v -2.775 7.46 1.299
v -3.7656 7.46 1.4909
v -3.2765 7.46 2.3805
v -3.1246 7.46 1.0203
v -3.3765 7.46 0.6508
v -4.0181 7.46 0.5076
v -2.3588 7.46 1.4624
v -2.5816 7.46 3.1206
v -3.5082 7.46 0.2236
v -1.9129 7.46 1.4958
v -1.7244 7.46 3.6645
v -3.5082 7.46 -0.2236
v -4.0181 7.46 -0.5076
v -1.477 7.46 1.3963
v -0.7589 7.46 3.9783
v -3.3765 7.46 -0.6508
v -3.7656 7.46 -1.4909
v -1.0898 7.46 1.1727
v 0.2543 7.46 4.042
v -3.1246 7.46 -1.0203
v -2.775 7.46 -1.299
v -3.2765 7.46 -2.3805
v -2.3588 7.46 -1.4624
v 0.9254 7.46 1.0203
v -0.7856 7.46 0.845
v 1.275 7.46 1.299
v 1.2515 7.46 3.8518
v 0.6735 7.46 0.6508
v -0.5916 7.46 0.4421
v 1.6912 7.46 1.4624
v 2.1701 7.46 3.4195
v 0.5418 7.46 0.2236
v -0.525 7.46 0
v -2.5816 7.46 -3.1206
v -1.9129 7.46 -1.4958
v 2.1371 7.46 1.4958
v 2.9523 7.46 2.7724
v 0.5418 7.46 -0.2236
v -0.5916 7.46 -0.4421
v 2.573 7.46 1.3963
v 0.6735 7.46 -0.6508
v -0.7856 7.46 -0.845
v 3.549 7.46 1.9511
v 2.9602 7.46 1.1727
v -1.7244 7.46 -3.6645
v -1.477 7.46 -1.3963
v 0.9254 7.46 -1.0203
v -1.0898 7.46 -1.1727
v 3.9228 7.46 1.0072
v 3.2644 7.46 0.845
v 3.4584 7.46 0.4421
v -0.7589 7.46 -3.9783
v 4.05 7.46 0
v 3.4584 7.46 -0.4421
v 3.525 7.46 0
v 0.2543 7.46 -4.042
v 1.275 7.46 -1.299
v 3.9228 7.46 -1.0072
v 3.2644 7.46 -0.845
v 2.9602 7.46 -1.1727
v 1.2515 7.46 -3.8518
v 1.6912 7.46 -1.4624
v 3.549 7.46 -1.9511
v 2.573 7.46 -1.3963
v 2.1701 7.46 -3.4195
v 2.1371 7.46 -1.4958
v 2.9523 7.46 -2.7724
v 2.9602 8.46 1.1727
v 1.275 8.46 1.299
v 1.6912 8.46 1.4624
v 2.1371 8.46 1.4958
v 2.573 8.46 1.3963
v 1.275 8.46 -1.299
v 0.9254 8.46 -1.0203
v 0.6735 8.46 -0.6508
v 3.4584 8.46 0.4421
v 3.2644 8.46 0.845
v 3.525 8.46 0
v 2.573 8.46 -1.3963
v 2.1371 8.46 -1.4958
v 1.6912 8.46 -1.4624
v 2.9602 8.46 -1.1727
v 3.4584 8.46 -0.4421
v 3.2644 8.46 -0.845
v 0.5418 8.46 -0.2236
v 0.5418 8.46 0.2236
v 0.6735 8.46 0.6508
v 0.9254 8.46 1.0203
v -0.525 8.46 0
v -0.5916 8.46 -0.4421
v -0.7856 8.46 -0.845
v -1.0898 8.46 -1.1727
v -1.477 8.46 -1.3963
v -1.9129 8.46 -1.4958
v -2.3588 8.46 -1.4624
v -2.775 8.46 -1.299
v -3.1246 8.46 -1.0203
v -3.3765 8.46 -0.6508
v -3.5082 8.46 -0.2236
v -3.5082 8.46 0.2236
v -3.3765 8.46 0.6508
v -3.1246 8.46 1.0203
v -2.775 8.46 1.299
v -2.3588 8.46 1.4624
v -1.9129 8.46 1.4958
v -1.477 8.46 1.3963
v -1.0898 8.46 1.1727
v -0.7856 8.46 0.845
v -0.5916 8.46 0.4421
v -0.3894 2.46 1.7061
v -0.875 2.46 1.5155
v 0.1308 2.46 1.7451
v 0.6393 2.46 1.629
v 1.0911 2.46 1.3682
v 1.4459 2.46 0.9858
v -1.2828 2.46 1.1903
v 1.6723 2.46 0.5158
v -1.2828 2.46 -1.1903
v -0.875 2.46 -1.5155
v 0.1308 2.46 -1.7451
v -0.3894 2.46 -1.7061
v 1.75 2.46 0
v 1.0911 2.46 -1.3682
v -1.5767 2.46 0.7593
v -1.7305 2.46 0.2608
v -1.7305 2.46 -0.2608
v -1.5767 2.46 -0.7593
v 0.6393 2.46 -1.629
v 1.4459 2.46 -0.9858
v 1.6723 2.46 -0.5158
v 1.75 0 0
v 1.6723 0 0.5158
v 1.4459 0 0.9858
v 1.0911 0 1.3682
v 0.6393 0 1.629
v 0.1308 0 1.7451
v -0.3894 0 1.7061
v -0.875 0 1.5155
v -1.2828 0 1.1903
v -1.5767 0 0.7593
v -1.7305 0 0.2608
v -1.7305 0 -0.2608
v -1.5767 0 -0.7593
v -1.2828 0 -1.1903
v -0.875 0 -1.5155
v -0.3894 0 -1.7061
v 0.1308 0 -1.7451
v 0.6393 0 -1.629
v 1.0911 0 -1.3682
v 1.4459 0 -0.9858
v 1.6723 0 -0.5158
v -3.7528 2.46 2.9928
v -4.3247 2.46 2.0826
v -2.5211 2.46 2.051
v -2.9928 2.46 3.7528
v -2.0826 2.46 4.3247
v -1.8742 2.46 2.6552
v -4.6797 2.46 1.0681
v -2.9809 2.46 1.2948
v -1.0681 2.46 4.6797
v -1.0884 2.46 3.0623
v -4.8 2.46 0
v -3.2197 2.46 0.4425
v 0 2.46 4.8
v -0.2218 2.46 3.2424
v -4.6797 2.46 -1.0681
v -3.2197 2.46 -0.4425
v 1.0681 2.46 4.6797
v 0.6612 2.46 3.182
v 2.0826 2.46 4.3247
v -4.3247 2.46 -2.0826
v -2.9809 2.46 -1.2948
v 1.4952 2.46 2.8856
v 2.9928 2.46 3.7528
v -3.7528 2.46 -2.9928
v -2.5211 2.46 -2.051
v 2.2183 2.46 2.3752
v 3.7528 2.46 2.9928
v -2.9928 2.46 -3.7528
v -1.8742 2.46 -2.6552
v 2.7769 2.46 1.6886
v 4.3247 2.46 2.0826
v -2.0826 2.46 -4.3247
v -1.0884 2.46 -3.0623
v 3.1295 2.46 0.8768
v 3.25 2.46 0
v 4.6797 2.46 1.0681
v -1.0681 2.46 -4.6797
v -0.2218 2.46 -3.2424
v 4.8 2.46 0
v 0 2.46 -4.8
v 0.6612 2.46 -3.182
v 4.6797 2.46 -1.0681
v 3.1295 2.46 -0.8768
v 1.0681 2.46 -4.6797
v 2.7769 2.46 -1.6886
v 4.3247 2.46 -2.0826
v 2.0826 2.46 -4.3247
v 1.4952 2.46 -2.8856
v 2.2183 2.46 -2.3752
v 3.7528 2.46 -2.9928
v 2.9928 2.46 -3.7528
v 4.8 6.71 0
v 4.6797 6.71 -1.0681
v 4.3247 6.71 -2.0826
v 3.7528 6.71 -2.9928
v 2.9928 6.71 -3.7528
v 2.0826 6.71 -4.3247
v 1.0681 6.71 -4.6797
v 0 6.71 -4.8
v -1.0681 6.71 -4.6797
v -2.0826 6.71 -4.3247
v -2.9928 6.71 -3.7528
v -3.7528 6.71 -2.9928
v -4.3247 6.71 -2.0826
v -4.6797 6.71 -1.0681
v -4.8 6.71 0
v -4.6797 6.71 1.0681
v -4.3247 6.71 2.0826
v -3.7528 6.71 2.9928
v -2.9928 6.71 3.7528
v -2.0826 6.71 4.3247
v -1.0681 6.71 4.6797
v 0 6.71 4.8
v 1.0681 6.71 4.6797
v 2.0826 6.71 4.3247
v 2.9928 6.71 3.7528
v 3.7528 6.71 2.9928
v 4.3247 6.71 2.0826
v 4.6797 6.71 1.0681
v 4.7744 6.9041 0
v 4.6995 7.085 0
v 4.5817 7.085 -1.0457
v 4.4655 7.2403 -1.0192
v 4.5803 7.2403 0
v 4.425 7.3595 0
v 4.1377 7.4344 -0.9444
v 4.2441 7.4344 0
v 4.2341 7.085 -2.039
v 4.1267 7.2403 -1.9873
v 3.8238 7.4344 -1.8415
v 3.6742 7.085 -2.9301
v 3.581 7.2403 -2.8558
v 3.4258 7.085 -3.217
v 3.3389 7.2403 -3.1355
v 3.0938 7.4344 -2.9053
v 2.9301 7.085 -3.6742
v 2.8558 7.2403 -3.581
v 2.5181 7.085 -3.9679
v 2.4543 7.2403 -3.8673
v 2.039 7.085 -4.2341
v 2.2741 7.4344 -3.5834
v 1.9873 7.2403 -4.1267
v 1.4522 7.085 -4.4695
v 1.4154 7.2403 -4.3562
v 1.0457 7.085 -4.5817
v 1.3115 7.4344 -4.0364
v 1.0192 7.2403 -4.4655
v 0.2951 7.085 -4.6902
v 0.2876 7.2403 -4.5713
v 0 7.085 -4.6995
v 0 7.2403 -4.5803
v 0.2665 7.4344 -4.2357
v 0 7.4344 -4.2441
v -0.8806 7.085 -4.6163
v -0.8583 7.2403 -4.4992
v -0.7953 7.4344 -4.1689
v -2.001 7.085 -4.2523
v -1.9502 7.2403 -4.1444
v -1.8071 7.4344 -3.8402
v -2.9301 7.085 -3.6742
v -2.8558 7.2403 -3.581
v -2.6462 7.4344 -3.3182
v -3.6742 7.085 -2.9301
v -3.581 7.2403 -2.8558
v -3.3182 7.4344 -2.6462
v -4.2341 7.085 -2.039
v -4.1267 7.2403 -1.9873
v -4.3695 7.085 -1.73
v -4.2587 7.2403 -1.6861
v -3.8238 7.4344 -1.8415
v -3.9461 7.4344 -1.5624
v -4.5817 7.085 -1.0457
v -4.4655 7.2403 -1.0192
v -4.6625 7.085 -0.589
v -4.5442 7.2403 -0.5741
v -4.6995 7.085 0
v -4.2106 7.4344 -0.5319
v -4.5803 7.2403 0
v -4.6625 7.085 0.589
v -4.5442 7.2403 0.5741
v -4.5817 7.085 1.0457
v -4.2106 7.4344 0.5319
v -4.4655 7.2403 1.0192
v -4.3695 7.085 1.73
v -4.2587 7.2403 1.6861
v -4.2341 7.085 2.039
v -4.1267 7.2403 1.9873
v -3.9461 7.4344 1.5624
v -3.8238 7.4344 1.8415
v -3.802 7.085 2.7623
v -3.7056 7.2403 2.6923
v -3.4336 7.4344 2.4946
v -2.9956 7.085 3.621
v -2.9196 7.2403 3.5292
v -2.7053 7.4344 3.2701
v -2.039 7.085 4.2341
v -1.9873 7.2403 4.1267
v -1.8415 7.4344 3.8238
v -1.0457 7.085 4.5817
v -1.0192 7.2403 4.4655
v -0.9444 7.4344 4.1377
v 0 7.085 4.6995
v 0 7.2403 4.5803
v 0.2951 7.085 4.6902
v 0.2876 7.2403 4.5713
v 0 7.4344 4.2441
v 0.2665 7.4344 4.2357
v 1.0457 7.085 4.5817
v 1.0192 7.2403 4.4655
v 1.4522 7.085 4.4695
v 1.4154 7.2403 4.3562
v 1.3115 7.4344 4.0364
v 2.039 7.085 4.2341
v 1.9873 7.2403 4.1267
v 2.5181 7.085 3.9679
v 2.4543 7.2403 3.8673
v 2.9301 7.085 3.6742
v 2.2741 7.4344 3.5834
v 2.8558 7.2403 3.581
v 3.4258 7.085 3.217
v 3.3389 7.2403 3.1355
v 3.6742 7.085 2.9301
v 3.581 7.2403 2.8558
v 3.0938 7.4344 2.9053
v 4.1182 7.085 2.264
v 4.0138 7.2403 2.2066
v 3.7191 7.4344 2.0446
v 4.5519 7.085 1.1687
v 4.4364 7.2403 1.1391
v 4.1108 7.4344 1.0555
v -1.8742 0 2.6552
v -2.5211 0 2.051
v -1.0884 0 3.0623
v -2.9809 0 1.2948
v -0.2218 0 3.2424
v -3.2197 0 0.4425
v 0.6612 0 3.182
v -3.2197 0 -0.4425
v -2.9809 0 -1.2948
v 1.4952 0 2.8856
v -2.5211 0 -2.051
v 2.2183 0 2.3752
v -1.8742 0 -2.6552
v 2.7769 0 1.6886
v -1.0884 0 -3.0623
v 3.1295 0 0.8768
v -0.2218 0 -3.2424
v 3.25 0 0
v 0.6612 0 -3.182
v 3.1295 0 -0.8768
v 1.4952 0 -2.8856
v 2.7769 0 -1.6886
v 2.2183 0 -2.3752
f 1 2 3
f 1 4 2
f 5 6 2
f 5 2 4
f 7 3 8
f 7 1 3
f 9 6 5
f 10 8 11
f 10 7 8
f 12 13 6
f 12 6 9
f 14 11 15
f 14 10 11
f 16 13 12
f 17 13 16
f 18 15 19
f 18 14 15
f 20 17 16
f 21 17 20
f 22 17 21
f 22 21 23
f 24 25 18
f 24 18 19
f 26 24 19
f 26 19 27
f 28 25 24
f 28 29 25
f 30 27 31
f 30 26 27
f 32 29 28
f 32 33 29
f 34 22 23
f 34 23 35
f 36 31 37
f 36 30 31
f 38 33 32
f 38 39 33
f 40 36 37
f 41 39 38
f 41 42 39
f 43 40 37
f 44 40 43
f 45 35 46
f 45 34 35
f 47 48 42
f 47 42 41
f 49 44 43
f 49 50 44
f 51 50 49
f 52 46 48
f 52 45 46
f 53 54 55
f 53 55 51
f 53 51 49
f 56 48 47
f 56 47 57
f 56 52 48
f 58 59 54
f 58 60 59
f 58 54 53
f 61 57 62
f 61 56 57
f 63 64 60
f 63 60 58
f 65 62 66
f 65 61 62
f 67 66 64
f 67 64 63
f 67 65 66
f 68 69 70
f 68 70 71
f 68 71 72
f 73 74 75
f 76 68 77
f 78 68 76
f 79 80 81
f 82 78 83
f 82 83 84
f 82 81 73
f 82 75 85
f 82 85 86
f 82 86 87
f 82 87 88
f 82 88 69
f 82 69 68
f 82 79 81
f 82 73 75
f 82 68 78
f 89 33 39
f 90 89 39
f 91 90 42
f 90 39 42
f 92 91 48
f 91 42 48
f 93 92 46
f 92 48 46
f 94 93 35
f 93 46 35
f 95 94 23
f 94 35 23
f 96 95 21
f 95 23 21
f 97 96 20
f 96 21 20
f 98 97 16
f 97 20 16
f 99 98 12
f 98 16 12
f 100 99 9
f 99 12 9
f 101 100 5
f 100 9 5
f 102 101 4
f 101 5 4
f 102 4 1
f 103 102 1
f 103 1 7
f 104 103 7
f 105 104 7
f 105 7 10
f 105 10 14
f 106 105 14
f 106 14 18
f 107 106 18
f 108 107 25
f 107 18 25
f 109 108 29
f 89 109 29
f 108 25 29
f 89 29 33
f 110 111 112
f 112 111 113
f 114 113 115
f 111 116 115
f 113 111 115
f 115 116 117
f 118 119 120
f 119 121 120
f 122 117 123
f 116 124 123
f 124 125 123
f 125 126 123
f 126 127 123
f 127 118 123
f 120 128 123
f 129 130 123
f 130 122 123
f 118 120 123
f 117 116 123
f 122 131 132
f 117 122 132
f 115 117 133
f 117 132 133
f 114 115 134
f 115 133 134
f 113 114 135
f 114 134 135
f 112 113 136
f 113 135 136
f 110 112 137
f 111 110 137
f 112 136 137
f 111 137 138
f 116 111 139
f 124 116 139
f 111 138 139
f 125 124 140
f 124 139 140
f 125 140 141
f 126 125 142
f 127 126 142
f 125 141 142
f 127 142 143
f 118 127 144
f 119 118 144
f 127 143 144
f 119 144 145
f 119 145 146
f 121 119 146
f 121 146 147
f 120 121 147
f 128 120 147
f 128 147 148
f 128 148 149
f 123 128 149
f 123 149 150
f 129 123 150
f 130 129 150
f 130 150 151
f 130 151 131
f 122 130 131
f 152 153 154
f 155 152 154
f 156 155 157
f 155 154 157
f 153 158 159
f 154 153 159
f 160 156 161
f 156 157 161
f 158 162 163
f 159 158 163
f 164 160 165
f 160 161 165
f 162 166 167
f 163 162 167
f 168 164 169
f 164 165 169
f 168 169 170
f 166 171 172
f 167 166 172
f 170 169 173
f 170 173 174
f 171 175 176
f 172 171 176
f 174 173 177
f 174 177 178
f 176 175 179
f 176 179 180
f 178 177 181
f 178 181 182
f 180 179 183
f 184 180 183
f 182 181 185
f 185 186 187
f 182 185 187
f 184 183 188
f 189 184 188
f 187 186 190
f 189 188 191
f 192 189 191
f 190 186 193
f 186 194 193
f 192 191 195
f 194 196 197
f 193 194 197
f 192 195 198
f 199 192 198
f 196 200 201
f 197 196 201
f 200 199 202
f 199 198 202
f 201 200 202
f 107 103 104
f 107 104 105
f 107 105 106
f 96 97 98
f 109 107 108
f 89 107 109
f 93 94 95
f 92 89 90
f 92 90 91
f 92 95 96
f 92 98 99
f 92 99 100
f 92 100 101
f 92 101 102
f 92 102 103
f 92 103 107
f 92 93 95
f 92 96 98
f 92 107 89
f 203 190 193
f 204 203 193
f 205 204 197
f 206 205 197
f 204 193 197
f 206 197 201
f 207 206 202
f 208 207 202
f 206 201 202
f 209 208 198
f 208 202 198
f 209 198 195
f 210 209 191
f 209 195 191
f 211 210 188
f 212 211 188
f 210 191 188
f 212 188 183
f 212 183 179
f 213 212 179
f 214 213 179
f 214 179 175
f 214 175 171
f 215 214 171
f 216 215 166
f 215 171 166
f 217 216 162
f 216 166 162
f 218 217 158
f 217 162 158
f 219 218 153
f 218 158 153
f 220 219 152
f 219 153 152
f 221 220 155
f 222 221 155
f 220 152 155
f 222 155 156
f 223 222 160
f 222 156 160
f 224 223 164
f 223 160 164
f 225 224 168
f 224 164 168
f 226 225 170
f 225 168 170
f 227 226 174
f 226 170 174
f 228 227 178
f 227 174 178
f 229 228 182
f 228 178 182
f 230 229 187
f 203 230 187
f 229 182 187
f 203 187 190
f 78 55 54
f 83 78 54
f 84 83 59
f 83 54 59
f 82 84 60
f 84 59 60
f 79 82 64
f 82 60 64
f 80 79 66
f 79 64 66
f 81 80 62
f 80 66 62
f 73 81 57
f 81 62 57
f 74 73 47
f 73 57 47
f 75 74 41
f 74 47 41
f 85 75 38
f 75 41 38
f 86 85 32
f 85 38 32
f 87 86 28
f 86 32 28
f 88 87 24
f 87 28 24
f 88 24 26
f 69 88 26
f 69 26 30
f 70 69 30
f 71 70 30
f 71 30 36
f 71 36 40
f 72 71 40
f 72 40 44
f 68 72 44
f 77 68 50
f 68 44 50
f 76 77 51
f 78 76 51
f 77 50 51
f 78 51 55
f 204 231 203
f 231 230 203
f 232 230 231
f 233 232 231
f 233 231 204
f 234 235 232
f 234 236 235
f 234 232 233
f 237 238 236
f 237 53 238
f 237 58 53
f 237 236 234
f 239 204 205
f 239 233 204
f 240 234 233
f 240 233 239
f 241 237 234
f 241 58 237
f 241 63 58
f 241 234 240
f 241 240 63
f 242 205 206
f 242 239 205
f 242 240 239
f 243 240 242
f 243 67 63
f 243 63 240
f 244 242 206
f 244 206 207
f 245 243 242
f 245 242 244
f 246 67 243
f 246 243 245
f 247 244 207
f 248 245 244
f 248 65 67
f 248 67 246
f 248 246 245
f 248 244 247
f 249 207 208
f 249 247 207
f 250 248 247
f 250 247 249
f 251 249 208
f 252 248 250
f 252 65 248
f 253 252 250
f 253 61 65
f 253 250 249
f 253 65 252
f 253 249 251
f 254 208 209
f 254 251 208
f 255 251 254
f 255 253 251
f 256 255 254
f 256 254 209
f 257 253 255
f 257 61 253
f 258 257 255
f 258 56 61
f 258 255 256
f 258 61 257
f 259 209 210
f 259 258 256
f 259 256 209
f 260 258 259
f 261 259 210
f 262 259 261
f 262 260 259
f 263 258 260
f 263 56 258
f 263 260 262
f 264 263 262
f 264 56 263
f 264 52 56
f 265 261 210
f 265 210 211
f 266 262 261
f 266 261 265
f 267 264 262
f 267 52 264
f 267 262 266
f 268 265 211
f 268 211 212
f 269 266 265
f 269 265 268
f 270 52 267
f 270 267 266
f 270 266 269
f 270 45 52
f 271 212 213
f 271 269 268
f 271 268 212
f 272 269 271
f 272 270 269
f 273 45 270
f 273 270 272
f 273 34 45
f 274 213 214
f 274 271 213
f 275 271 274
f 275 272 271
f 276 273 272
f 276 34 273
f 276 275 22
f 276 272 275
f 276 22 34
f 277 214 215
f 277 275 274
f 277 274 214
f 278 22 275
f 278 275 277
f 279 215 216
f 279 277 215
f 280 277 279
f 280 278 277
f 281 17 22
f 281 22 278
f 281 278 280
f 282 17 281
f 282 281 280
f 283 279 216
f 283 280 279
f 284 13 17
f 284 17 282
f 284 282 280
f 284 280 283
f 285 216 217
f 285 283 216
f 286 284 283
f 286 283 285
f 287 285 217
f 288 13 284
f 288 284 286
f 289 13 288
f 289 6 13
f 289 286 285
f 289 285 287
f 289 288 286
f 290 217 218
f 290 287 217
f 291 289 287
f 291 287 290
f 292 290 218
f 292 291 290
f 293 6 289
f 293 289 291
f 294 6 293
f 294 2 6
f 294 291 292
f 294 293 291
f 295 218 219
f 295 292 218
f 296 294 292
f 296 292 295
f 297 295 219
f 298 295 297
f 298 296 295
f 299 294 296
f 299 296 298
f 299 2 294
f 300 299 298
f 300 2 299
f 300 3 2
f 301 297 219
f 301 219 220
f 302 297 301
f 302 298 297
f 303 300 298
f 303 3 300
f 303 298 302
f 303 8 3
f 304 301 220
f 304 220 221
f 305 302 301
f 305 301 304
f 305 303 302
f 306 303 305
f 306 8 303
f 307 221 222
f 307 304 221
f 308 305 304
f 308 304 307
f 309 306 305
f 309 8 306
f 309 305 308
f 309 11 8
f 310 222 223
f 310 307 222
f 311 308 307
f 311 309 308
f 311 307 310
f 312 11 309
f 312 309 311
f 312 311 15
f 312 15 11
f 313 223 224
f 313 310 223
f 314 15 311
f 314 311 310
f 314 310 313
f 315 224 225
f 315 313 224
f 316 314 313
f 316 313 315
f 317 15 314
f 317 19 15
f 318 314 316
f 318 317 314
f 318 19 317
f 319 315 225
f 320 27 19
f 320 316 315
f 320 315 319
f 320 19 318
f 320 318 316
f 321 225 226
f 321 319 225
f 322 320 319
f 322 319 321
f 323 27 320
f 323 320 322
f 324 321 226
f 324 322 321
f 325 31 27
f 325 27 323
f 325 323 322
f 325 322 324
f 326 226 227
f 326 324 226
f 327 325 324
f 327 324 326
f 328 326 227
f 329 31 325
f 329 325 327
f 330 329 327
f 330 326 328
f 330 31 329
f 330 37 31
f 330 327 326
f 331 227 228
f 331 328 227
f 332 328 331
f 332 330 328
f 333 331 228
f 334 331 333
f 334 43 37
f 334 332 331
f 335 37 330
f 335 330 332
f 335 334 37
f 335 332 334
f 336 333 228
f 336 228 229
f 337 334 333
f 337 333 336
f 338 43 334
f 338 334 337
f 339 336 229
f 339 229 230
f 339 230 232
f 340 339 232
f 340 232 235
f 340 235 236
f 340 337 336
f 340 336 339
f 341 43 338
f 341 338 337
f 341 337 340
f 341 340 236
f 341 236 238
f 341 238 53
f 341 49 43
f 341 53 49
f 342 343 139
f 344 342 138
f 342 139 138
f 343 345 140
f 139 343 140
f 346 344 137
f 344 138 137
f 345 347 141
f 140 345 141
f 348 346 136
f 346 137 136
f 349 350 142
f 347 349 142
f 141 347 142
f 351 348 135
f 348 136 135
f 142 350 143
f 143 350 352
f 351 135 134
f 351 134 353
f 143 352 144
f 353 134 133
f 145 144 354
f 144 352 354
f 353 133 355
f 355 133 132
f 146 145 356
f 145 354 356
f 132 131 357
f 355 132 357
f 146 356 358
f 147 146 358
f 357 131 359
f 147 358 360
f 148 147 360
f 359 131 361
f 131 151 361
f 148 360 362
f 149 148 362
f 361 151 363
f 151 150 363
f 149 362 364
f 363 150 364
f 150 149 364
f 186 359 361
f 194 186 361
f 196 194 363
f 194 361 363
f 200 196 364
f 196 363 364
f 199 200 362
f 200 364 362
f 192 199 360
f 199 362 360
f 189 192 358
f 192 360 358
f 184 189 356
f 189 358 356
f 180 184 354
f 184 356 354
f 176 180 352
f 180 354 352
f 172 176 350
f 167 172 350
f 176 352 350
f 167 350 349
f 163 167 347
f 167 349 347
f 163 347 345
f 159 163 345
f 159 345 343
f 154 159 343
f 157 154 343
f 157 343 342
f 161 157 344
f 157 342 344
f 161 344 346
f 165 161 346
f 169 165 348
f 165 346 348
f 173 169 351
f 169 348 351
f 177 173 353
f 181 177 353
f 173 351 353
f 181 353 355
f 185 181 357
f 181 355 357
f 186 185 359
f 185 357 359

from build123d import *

# Parameters (mm, degrees)
SKETCH1_R           = 3.25
BOSS_EXTRUDE1_DEPTH = 2.46
SKETCH2_R           = 1.75
CUT_EXTRUDE1_DEPTH  = 2.5
SKETCH6_R           = 4.8
BOSS_EXTRUDE2_DEPTH = 5
FILLET2_R           = 0.75
SKETCH7_R           = 1.5
BOSS_EXTRUDE3_DEPTH = 1


with BuildPart() as part:
    # Sketch1 → Boss-Extrude1 (new body)
    with BuildSketch(Plane(origin=(0, 0, 0), x_dir=(1, 0, 0), z_dir=(0, 1, 0))):
        Circle(SKETCH1_R)
    extrude(amount=BOSS_EXTRUDE1_DEPTH)

    # Sketch2 → Cut-Extrude1 (cut)
    with BuildSketch(Plane.XZ):
        Circle(SKETCH2_R)
    extrude(amount=-CUT_EXTRUDE1_DEPTH, mode=Mode.SUBTRACT)

    # Sketch6 → Boss-Extrude2 (add)
    with BuildSketch(Plane(origin=(0, 2.46, 0), x_dir=(1, 0, 0), z_dir=(0, 1, 0))):
        Circle(SKETCH6_R)
    extrude(amount=BOSS_EXTRUDE2_DEPTH)

    # Fillet2
    fillet2_edges = [part.edges().sort_by_distance(p)[0] for p in [
        (-4.8, 7.46, 0),
    ]]
    fillet(fillet2_edges, radius=FILLET2_R)

    # Sketch7 → Boss-Extrude3 (add)
    with BuildSketch(Plane(origin=(0, 7.46, 0), x_dir=(1, 0, 0), z_dir=(0, 1, 0))):
        with Locations((-2.025, 0)):
            Circle(SKETCH7_R)
        with Locations((2.025, 0)):
            Circle(SKETCH7_R)
    extrude(amount=BOSS_EXTRUDE3_DEPTH)


solid = part.part
